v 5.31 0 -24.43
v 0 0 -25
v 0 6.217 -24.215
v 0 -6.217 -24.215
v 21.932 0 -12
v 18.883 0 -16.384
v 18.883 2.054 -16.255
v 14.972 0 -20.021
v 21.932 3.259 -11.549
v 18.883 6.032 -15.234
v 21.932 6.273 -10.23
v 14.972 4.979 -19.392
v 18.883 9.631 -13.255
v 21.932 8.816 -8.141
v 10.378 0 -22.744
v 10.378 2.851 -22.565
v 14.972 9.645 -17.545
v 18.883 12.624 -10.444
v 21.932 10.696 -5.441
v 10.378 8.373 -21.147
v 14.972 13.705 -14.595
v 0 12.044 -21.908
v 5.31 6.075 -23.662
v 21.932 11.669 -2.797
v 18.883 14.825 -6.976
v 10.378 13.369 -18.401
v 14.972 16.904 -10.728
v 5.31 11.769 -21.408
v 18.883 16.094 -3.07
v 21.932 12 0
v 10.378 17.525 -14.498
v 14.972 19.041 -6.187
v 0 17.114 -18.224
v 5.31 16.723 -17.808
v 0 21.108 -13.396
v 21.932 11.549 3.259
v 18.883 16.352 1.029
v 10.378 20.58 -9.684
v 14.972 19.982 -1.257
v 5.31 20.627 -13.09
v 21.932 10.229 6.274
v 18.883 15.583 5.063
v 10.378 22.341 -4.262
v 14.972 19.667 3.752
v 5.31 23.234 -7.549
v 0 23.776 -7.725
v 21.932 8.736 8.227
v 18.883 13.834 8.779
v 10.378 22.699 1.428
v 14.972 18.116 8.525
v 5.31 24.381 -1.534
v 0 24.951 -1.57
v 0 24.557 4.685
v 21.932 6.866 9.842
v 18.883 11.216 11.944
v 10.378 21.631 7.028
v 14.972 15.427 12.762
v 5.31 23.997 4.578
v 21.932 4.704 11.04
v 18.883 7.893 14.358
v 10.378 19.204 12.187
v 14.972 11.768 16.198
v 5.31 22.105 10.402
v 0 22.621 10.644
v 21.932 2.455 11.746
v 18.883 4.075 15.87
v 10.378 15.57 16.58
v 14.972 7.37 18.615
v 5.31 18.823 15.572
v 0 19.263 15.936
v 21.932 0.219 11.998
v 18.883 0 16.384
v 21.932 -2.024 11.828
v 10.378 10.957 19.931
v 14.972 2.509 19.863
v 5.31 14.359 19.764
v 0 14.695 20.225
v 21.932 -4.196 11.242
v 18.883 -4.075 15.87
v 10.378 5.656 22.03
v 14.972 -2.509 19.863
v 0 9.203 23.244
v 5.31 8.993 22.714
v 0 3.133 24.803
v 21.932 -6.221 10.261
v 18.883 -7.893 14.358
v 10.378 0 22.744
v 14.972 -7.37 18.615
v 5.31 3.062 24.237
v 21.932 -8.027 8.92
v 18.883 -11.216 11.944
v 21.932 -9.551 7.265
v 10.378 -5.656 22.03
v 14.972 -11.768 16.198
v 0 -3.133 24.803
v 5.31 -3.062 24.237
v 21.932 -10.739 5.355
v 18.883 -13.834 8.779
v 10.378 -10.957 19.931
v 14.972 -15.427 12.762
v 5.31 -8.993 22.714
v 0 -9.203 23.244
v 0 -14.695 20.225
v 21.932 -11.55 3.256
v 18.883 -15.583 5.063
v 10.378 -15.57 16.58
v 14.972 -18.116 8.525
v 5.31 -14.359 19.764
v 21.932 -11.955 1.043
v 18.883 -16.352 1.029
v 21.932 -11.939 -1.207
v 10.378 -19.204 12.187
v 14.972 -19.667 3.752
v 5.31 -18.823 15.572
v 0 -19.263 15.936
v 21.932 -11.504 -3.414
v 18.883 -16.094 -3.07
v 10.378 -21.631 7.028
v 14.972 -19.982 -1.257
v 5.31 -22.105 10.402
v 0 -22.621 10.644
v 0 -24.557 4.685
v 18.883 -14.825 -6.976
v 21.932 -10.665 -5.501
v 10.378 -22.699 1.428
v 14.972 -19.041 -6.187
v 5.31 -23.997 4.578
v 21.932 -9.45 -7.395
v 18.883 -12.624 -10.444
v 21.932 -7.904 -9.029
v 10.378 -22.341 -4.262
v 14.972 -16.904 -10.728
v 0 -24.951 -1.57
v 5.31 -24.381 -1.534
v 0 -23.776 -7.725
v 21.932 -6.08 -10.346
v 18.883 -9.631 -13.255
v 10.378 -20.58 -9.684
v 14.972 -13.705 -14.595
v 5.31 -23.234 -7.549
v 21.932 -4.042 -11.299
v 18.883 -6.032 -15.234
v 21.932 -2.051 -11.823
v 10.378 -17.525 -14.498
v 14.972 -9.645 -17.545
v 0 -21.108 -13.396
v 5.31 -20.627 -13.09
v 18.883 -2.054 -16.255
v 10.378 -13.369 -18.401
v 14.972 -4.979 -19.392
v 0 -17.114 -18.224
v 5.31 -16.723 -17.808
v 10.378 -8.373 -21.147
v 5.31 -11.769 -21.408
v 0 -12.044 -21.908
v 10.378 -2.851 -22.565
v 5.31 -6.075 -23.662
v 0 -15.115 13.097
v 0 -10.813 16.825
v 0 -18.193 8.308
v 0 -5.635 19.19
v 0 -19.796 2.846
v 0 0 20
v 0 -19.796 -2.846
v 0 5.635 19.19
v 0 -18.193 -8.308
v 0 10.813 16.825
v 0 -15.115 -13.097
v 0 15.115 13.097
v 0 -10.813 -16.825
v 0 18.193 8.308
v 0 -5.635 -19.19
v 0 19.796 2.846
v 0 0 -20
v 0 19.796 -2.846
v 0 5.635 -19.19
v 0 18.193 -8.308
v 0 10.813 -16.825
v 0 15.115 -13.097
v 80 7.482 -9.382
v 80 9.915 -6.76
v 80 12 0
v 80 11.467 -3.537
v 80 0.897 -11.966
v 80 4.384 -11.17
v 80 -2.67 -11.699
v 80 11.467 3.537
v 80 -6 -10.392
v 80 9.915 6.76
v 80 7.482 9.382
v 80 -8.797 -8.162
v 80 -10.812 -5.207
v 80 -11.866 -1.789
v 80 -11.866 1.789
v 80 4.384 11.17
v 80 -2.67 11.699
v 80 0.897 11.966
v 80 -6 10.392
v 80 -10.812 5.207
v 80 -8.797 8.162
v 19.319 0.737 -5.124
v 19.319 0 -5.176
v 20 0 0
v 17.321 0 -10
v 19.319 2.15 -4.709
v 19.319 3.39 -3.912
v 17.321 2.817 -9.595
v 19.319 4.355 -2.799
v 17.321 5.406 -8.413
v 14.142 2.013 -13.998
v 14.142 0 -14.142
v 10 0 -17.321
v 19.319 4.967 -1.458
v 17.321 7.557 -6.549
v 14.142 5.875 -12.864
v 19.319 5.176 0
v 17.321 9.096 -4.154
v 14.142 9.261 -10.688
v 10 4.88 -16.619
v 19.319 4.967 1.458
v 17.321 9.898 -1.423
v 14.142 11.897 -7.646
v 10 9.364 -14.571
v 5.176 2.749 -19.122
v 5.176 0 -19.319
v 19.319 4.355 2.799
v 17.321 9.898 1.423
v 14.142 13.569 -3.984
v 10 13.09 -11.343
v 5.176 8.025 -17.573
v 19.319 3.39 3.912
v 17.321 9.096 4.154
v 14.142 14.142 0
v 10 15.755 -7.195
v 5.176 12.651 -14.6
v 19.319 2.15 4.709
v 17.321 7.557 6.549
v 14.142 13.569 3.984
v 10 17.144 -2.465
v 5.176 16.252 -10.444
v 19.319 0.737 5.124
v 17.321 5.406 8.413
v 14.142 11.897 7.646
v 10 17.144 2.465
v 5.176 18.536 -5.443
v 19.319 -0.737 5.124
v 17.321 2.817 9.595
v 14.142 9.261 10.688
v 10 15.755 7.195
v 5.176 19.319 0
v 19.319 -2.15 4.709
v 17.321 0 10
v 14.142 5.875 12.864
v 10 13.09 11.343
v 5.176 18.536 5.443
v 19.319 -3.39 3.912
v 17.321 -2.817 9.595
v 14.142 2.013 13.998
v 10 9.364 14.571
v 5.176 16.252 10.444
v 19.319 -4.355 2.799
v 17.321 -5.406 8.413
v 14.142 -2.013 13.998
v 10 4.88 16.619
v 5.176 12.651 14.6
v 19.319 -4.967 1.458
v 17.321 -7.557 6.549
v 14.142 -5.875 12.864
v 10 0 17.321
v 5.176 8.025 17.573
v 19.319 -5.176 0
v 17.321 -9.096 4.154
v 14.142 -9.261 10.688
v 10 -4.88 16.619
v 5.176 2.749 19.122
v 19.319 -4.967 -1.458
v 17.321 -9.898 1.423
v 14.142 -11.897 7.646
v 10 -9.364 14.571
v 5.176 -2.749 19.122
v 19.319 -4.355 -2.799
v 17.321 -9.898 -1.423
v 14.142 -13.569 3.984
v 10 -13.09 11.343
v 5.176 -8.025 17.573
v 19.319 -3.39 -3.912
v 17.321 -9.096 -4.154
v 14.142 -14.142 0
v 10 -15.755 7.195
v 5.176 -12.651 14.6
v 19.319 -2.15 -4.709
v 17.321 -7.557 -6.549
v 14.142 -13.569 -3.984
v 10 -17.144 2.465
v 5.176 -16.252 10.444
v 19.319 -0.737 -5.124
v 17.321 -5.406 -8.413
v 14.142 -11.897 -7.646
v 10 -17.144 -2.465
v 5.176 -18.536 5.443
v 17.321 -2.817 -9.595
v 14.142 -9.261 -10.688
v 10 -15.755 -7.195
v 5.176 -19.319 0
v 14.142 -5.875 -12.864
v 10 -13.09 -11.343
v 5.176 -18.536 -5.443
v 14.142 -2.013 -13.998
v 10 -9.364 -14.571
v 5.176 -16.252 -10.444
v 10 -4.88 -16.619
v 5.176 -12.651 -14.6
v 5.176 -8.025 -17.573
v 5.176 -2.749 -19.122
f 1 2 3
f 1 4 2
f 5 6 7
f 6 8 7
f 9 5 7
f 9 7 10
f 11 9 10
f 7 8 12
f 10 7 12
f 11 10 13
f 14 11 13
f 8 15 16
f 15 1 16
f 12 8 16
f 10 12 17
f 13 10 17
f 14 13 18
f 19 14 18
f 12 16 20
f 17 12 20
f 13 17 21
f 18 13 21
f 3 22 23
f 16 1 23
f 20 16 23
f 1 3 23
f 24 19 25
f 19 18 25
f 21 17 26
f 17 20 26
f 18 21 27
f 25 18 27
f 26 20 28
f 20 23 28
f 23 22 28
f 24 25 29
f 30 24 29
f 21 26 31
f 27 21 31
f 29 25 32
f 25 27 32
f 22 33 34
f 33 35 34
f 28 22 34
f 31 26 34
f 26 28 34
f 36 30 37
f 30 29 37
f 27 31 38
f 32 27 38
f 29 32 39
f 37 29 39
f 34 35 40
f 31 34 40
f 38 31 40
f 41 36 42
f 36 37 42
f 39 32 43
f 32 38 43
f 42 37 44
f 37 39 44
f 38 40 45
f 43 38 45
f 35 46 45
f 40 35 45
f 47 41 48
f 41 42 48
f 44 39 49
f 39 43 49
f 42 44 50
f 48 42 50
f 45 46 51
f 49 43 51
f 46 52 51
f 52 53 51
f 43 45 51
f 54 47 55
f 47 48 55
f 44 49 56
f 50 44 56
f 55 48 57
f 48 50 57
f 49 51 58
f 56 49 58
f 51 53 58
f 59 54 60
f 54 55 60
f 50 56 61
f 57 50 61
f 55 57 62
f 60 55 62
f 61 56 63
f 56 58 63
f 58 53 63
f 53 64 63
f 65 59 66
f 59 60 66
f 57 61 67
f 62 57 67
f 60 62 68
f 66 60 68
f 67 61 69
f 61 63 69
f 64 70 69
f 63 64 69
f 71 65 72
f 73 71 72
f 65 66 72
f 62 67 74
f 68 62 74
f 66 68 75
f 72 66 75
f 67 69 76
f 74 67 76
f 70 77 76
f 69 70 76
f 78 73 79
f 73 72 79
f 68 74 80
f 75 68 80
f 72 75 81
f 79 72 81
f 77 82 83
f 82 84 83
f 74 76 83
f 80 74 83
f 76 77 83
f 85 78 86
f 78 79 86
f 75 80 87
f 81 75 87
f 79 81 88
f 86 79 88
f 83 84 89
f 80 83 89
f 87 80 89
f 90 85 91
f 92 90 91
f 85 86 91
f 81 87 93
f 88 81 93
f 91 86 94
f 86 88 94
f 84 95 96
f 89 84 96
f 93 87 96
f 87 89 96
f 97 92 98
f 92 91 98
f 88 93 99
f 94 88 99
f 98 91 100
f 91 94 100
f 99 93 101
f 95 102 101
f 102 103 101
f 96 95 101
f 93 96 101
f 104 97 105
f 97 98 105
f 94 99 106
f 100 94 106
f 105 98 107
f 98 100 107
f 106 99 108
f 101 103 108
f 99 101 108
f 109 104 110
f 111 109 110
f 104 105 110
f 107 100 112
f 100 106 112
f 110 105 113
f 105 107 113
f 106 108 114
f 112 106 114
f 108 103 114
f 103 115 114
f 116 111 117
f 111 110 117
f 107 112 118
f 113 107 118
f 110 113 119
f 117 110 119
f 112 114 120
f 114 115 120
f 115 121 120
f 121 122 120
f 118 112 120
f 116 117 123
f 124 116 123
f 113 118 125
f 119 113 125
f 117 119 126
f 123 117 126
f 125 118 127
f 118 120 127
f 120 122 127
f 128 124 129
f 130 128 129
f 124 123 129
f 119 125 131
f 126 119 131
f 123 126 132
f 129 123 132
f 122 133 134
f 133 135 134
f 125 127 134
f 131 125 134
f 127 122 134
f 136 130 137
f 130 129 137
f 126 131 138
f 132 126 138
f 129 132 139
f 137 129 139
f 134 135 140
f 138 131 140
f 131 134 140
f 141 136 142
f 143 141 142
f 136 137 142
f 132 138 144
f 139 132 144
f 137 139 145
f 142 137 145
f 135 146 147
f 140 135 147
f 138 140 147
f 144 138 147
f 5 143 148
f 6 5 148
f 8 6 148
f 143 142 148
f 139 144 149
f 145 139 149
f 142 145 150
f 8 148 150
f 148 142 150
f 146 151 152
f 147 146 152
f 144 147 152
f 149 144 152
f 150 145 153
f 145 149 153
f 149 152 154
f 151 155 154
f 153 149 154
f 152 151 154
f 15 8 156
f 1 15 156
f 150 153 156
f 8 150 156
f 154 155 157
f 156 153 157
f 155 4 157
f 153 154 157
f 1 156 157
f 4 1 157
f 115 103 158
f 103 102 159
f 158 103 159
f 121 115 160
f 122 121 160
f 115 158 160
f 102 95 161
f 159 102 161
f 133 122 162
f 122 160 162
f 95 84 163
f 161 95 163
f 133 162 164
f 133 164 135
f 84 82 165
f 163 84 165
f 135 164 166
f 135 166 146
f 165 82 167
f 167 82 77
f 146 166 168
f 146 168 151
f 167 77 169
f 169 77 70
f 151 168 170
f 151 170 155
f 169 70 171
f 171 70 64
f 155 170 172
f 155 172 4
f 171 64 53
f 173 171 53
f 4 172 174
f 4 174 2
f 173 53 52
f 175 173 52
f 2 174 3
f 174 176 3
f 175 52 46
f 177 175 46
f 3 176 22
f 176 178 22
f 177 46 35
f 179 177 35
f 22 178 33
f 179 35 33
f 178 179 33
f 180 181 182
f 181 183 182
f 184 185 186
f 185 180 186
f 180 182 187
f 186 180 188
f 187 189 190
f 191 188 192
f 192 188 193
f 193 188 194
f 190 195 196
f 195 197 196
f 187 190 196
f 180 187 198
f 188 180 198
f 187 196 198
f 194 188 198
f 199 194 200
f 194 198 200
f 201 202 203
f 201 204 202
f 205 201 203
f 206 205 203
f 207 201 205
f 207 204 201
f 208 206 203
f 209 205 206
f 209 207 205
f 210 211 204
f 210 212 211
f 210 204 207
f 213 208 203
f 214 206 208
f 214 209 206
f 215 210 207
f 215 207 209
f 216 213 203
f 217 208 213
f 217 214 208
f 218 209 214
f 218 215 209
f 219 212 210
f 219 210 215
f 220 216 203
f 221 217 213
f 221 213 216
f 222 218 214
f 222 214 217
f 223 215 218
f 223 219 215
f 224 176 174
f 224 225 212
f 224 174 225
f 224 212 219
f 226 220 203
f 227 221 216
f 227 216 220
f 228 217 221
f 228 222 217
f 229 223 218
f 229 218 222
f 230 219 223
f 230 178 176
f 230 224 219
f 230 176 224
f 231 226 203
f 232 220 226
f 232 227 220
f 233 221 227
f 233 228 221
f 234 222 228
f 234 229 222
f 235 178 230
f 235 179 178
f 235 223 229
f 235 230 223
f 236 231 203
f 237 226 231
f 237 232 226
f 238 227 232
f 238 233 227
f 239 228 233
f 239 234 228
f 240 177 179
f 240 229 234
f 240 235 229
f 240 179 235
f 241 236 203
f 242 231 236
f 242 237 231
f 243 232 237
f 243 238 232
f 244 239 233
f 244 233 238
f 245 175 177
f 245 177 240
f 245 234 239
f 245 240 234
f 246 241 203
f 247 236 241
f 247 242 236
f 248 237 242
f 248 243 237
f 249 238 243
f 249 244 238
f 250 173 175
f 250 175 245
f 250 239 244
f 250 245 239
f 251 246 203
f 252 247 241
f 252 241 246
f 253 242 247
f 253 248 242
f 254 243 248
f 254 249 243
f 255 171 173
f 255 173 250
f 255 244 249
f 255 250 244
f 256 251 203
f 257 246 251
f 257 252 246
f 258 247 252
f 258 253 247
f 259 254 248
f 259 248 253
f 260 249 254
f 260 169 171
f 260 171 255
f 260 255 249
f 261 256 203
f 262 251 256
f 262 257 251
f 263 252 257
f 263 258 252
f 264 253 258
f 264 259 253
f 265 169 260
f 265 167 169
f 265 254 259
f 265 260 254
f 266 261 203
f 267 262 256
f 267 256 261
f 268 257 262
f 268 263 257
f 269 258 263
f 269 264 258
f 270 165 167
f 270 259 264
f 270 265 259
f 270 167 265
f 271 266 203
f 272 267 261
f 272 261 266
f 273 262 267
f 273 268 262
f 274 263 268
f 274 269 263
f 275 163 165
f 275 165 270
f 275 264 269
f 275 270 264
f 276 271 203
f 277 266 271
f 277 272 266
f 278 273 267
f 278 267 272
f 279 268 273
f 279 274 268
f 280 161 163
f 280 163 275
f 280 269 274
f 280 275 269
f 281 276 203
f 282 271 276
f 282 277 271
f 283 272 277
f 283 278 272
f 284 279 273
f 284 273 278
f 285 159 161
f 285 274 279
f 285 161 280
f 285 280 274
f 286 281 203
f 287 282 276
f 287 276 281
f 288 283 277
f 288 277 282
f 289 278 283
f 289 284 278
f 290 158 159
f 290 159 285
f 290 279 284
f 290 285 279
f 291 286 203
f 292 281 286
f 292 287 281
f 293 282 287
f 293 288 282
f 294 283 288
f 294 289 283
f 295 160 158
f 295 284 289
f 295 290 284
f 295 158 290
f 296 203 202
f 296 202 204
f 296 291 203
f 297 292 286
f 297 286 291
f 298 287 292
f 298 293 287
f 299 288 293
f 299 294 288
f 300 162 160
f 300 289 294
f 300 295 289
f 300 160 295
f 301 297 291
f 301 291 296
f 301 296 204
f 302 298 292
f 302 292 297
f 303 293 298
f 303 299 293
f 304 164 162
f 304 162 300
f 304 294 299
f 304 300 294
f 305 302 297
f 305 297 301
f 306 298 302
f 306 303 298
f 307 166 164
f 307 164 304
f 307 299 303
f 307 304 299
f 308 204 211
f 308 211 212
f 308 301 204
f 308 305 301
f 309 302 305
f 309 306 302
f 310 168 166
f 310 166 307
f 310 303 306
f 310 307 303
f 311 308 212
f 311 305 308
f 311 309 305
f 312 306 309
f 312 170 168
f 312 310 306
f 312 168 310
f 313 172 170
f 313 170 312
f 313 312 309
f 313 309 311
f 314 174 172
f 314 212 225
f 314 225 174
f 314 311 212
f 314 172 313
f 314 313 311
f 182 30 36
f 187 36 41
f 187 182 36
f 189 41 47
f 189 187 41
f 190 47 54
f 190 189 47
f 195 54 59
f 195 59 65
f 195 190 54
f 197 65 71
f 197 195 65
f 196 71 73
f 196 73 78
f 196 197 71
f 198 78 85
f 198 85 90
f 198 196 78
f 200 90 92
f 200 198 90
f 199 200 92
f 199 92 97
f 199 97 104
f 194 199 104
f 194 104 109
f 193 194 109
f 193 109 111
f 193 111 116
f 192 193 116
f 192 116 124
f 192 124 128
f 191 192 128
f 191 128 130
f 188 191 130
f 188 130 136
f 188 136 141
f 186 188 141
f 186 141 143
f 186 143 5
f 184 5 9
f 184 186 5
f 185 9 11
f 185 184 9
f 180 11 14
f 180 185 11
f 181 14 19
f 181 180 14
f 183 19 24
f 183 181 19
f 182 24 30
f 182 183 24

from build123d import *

# Parameters (mm, degrees)
SHELL1_T  = -5
SKETCH3_W = 60
SKETCH3_H = 12


with BuildPart() as part:
    # Sketch2 → Revolve1 (revolve)
    with BuildSketch(Plane(origin=(0, 0, 0), x_dir=(1, 0, 0), z_dir=(0, 1, 0))):
        with BuildLine():
            Line((0, 25), (0, 0))
            Line((0, 0), (25, 0))
            ThreePointArc((25, 0), (17.67766953, 17.67766953), (0, 25))
        make_face()
    revolve(axis=Axis((0, 0, 0), (1, 0, 0)))

    # Shell1
    shell1_openings = [part.faces().sort_by_distance(p)[0] for p in [
        (0, 0, 25),
    ]]
    offset(amount=SHELL1_T, openings=shell1_openings, kind=Kind.INTERSECTION)

    # Sketch3 → Revolve3 (revolve)
    with BuildSketch(Plane.XY):
        with Locations((50, 6)):
            Rectangle(SKETCH3_W, SKETCH3_H)
    revolve(axis=Axis((20, 0, 0), (1, 0, 0)))


solid = part.part
